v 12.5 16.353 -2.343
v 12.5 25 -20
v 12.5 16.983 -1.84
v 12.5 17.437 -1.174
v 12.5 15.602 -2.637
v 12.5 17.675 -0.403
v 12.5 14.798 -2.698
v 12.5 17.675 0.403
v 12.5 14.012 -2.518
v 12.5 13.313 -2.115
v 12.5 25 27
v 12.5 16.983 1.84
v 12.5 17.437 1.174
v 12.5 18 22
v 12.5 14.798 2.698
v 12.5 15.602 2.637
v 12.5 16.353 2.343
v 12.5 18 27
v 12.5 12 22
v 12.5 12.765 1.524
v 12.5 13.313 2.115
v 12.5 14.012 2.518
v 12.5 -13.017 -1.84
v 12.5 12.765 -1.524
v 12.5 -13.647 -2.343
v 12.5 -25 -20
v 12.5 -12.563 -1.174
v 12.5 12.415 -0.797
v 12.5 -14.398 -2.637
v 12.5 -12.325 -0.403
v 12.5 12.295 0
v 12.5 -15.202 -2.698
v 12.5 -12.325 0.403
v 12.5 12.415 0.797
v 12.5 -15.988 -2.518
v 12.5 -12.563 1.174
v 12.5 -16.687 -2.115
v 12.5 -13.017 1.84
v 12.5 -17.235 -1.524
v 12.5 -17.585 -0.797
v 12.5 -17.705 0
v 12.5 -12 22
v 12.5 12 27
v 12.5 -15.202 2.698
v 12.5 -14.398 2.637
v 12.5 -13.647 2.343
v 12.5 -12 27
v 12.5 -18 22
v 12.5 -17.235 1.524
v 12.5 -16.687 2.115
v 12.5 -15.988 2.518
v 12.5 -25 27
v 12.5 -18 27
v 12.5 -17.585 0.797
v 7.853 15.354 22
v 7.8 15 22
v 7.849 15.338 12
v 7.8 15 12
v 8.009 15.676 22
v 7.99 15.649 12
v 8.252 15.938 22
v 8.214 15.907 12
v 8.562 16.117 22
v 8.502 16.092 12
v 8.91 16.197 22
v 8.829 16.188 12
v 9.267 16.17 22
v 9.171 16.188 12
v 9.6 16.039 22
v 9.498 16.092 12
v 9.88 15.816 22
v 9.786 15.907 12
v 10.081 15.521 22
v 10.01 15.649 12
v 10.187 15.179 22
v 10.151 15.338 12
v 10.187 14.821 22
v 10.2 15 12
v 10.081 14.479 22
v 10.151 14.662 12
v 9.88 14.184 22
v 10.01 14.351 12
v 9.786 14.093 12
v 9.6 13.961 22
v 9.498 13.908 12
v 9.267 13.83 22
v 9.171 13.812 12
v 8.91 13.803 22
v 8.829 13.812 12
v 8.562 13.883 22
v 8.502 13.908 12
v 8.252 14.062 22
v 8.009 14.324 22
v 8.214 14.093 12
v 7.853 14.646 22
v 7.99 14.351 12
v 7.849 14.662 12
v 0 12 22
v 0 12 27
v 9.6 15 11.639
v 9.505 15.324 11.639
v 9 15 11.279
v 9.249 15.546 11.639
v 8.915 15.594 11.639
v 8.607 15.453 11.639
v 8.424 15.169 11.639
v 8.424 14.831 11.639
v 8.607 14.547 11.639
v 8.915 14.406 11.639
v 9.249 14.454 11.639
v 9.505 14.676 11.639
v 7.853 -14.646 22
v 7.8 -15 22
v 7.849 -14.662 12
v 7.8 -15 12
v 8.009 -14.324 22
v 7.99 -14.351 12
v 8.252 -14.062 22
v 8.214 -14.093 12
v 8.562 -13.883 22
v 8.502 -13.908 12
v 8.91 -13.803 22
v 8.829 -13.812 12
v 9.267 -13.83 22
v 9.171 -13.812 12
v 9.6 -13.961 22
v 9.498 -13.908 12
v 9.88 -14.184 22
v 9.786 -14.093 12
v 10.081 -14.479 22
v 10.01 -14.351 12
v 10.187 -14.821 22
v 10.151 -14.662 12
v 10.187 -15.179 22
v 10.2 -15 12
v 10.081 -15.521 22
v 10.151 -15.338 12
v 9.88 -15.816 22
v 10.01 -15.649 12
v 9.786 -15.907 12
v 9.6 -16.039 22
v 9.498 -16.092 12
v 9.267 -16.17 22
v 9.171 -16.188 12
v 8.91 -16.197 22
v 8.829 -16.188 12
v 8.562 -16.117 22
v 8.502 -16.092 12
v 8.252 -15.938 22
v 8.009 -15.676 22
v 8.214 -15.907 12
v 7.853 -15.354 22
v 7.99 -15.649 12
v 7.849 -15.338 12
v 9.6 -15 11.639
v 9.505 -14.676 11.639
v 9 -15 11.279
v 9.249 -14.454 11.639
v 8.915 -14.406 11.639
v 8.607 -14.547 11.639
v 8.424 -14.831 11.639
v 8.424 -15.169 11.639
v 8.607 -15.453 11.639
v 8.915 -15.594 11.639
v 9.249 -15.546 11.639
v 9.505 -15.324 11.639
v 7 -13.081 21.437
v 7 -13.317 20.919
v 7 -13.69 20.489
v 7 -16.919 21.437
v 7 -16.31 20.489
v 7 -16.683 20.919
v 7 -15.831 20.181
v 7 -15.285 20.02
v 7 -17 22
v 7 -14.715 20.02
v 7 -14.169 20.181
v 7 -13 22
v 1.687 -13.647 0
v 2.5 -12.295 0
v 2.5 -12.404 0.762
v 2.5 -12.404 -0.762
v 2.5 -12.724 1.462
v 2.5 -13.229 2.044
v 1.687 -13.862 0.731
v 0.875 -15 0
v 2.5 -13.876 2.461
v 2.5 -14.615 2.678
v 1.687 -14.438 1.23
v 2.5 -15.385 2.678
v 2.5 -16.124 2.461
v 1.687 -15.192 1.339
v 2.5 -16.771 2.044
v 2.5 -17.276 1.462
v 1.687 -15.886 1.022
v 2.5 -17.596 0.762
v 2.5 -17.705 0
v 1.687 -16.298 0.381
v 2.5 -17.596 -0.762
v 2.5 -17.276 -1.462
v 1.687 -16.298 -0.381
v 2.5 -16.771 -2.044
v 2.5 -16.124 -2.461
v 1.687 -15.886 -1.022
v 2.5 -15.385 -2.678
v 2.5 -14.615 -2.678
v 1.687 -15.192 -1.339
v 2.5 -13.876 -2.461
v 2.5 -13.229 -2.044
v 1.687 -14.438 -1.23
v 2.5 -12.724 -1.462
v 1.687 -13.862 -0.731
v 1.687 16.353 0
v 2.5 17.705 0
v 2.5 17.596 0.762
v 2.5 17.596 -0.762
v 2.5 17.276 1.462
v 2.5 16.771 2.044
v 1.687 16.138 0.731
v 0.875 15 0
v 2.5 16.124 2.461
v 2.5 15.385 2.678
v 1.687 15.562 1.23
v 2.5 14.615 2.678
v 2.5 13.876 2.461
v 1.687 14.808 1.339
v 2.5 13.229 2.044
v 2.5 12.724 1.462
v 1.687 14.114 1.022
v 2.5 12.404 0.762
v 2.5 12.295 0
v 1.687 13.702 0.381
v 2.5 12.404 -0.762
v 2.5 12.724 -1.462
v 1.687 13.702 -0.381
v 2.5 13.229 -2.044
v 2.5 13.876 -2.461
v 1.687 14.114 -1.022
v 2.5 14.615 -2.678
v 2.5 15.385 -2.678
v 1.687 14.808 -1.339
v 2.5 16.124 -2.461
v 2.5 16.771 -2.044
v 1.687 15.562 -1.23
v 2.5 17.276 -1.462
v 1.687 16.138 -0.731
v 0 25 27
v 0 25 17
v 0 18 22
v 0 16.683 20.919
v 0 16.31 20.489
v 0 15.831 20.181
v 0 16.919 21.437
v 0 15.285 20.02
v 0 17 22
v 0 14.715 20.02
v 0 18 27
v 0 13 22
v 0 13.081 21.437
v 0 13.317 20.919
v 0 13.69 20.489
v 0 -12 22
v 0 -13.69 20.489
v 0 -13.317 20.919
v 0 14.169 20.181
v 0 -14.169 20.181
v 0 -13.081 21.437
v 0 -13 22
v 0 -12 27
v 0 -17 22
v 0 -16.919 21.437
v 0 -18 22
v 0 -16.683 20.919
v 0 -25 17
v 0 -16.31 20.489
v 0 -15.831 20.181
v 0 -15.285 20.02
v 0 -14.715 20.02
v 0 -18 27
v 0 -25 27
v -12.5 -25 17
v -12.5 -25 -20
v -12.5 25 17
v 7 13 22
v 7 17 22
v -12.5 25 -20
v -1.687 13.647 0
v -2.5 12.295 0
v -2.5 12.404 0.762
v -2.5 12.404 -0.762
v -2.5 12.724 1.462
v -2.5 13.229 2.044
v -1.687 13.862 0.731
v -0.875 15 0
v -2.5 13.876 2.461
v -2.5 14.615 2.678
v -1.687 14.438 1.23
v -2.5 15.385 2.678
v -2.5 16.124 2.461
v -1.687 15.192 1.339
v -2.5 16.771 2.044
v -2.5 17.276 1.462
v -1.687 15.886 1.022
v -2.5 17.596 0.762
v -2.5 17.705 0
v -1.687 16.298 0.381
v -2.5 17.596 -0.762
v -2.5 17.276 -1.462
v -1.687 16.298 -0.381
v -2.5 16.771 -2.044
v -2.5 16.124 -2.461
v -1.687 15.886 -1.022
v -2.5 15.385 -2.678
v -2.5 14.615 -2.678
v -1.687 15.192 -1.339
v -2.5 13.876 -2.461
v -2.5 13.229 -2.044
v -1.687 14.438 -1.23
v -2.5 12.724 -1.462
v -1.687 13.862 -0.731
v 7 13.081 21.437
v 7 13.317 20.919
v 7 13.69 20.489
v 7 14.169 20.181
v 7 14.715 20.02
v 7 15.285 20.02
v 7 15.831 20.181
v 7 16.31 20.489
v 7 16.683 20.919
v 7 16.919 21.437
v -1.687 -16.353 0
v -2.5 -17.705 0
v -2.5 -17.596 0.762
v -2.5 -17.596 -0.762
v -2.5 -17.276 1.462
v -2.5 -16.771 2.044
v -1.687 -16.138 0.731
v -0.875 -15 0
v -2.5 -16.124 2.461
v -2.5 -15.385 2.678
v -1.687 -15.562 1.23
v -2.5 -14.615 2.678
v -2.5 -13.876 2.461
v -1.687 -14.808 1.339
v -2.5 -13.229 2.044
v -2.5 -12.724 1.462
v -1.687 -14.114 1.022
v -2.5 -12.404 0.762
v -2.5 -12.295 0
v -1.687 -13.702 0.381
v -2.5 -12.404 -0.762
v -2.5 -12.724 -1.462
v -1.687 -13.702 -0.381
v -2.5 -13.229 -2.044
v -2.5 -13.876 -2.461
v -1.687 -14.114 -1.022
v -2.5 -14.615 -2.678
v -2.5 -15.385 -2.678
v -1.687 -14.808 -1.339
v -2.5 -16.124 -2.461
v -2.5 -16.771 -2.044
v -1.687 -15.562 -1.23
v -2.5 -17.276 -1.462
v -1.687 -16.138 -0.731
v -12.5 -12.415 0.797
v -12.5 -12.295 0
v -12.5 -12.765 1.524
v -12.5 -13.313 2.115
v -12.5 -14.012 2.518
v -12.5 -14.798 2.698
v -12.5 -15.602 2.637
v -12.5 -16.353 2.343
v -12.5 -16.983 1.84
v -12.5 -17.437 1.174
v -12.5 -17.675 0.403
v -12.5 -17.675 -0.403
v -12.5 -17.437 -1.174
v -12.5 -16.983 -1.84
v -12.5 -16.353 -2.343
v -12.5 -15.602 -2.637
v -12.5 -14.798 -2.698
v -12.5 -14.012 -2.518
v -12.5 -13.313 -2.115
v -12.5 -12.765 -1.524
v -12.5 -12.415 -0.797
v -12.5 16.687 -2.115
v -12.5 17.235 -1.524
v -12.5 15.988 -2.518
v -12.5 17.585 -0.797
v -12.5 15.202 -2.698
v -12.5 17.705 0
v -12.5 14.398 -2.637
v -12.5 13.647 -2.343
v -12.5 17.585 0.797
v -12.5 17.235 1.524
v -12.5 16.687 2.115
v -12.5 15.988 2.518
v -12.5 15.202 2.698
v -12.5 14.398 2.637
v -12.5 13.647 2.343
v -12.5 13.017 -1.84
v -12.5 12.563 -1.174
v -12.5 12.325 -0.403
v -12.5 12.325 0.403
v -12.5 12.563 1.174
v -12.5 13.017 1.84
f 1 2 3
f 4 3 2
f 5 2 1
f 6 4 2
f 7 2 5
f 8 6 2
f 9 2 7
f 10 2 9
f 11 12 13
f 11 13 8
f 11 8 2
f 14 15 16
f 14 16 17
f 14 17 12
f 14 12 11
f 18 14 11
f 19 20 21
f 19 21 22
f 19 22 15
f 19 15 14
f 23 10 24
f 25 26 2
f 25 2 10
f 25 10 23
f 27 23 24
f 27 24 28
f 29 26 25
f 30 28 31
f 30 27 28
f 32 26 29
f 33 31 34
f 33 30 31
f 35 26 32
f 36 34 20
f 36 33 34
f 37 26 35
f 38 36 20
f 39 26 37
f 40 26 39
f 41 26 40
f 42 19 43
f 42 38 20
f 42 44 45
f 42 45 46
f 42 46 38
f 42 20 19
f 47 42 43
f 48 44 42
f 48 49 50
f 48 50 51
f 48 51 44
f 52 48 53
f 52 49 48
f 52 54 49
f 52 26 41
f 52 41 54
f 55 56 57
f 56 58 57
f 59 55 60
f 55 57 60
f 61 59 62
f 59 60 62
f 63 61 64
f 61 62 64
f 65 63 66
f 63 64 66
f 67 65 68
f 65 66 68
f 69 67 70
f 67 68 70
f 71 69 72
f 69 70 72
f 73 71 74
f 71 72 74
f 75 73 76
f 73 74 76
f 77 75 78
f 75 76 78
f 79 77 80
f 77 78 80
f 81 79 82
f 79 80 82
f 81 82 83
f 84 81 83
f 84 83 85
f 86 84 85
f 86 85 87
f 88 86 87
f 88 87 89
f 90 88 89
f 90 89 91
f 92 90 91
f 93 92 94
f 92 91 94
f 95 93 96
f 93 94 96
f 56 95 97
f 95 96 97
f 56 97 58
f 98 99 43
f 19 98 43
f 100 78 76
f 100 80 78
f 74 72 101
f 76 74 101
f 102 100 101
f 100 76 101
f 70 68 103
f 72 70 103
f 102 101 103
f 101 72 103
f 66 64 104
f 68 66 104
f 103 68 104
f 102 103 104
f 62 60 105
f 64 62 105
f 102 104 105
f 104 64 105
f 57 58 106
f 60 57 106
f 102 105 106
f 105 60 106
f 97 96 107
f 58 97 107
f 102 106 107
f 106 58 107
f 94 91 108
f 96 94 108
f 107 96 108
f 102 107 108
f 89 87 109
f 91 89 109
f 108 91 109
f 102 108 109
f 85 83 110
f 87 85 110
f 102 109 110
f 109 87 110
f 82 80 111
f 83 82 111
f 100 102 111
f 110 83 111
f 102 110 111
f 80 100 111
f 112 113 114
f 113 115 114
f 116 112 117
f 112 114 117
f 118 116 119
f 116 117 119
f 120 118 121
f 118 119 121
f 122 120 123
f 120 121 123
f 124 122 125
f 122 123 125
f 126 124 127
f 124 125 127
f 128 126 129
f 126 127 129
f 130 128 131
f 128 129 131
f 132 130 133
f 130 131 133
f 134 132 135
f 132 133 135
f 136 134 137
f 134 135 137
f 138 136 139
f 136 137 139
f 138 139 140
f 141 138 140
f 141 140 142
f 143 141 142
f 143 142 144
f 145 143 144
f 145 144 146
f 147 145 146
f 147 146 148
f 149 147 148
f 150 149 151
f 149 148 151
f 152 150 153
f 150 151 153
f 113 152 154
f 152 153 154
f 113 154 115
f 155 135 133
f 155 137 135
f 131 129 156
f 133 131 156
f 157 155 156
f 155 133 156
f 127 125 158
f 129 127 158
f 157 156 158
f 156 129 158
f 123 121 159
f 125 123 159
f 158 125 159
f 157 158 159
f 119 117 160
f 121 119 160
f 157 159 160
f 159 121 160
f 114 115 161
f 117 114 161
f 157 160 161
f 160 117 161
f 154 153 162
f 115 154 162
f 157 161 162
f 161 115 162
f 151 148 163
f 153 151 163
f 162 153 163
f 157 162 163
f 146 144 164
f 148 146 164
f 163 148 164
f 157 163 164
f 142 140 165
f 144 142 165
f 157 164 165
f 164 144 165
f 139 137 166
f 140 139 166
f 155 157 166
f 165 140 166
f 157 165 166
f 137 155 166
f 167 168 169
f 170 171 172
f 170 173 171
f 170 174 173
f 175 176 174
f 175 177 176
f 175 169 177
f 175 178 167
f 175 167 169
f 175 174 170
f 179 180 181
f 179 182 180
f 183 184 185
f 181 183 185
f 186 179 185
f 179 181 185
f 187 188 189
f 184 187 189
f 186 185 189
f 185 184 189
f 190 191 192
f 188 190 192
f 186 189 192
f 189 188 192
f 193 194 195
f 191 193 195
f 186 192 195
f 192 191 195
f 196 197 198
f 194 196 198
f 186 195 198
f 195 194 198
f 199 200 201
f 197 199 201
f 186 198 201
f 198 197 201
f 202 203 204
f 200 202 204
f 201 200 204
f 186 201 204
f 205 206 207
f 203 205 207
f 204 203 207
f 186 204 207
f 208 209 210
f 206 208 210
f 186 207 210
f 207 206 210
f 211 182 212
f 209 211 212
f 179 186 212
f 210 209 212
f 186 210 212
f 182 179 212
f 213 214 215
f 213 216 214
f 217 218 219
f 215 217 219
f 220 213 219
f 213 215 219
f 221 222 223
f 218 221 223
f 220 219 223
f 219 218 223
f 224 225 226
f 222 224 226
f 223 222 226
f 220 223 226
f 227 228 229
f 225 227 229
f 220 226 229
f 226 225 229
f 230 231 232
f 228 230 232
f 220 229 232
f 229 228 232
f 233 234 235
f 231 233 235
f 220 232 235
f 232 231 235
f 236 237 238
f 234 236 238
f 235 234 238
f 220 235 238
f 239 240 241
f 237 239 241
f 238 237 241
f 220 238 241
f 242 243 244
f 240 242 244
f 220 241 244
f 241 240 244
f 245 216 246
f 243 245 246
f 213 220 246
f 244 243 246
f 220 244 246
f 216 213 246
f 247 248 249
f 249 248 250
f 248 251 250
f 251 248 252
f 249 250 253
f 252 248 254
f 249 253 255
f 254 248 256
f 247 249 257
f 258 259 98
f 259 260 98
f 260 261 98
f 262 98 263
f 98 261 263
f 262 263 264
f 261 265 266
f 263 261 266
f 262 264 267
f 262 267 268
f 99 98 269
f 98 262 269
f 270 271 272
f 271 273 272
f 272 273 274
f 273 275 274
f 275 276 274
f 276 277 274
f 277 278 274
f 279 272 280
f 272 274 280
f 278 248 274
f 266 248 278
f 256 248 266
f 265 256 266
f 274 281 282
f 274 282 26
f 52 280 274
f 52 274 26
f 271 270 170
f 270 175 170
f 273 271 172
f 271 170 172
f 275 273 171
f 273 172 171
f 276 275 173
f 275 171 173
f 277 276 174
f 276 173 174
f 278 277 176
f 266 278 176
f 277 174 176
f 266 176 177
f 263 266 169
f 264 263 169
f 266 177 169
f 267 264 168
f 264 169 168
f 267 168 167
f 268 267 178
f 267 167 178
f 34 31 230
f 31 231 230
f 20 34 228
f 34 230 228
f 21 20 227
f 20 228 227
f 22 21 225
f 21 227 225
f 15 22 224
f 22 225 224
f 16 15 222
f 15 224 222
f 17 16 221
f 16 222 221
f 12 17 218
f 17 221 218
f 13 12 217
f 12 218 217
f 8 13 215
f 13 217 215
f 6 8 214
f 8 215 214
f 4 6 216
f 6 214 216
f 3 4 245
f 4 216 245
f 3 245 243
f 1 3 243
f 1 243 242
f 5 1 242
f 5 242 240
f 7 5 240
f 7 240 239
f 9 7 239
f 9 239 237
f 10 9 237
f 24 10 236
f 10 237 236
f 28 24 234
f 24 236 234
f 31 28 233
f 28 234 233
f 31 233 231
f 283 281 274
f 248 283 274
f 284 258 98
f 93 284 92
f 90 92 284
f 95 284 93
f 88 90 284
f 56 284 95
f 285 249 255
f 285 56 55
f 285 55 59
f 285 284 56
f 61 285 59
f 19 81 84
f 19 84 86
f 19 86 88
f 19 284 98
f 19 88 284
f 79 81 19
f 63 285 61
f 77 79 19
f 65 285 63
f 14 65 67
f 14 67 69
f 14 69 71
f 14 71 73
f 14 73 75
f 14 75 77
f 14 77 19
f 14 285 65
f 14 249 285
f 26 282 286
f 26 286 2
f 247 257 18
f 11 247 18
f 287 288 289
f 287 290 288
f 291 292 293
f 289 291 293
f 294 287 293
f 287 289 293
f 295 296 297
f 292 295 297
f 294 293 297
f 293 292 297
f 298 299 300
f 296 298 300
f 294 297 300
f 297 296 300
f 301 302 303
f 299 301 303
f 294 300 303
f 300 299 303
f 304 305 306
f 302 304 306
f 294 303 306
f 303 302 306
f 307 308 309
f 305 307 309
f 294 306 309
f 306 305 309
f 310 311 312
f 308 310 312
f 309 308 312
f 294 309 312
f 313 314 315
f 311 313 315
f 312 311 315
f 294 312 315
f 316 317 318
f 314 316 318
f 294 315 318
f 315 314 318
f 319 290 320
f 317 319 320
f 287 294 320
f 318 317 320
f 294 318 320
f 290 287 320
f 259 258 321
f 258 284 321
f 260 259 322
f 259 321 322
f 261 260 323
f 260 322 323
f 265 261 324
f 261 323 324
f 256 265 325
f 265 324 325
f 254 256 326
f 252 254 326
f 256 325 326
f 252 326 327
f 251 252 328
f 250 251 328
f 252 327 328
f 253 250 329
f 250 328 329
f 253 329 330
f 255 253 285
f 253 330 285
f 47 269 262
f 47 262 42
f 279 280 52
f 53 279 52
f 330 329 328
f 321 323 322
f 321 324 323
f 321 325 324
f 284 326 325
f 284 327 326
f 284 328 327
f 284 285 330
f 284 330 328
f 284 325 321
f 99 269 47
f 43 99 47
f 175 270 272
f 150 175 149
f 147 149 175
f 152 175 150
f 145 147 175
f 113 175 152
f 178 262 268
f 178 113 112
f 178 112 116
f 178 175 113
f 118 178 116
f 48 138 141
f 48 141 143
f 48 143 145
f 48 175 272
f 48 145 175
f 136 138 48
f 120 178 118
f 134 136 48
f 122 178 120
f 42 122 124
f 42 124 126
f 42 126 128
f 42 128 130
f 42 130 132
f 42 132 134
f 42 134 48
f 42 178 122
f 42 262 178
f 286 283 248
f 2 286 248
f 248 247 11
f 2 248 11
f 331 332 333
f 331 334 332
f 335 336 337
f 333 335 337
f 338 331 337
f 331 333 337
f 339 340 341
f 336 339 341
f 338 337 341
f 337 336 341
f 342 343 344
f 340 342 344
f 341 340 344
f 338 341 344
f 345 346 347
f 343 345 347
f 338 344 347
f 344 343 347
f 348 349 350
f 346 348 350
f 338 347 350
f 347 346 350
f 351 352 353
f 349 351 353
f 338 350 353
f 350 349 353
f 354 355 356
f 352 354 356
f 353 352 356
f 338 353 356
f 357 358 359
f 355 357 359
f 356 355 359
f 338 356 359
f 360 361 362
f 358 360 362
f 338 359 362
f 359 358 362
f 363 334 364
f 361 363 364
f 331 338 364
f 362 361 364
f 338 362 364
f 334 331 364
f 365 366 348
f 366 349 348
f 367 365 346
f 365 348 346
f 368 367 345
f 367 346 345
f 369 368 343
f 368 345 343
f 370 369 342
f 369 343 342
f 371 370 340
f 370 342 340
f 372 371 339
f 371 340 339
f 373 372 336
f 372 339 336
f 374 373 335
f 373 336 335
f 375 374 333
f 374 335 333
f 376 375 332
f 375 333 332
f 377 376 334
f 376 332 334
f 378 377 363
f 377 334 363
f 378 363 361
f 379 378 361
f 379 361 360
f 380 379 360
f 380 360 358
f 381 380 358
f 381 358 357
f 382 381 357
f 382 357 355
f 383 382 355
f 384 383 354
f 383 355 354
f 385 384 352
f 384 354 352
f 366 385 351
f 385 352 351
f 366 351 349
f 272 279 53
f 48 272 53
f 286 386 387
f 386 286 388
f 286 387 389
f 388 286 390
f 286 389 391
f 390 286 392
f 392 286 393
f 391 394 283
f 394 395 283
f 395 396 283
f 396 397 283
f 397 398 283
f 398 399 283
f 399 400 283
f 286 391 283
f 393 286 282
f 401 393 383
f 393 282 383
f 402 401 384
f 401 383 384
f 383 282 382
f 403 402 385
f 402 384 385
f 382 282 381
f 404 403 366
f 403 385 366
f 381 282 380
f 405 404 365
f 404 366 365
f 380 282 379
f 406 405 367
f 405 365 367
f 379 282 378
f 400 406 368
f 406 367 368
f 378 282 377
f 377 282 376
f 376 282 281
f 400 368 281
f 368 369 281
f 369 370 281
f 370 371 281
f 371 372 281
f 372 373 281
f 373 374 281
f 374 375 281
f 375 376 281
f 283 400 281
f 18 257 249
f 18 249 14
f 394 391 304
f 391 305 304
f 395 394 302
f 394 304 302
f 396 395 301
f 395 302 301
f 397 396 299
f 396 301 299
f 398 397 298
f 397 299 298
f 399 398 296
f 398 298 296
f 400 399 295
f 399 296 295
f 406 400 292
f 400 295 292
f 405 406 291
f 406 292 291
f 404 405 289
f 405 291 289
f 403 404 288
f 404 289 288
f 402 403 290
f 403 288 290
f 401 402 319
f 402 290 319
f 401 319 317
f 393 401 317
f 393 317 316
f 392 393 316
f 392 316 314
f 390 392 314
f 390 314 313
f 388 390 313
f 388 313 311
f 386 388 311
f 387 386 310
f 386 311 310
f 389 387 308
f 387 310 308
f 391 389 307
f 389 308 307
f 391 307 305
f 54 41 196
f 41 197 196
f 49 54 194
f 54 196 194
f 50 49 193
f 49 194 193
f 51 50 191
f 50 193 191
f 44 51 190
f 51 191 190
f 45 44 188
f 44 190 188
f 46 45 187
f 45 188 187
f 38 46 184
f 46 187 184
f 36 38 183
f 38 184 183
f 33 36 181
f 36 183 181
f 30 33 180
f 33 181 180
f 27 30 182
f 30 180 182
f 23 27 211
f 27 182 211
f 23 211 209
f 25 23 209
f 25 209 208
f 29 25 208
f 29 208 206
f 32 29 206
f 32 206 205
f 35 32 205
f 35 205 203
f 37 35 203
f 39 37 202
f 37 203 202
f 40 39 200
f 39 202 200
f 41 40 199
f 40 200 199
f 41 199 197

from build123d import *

# Parameters (mm, degrees)
F0_W             = 25
F0_H             = 47
F1_DEPTH         = 25
F4_D             = 5.4102
F4_DEPTH         = 10
F4_TIP           = 1.6253880605
F4_ON_F3_D       = 5.4102
F4_ON_F3_DEPTH   = 10
F4_ON_F3_TIP     = 1.6253880605
F5_W             = 12.5
F5_H             = 10
F6_DEPTH         = 50.001
F7_W             = 12.5
F7_H             = 6
F8_DEPTH         = 5
F11_D            = 2.4
F11_DEPTH        = 10
F11_TIP          = 0.7210327428
F11_ON_F10_D     = 2.4
F11_ON_F10_DEPTH = 10
F11_ON_F10_TIP   = 0.7210327428
F9_W             = 7
F9_H             = 2
F10_W            = 7
F10_H            = 2


with BuildPart() as f1:
    # F0 (on Front) → F1 (new body, symmetric)
    with BuildSketch(Plane.XZ):
        with Locations((0, 3.5)):
            Rectangle(F0_W, F0_H)
    extrude(amount=F1_DEPTH, both=True)

    # F4
    with Locations(Plane(origin=(-12.5, 0, 0), x_dir=(0, -1, 0), z_dir=(-1, 0, 0))):
        with Locations((-15, 0), (15, 0)):
            Hole(F4_D / 2, depth=F4_DEPTH)
            with Locations((0, 0, -(F4_DEPTH + F4_TIP / 2))):  # 118° drill point
                Cone(0, F4_D / 2, F4_TIP, mode=Mode.SUBTRACT)

    # F4 on F3
    with Locations(Plane.YZ.offset(12.5)):
        with Locations((-15, 0), (15, 0)):
            Hole(F4_ON_F3_D / 2, depth=F4_ON_F3_DEPTH)
            with Locations((0, 0, -(F4_ON_F3_DEPTH + F4_ON_F3_TIP / 2))):  # 118° drill point
                Cone(0, F4_ON_F3_D / 2, F4_ON_F3_TIP, mode=Mode.SUBTRACT)

    # F5 (on face) → F6 (cut, through all)
    with BuildSketch(Plane.XZ.offset(25)):
        with Locations((-6.25, 22)):
            Rectangle(F5_W, F5_H)
    extrude(amount=-F6_DEPTH, mode=Mode.SUBTRACT)

    # F7 (on face) → F8 (cut)
    with BuildSketch(Plane.XY.offset(27)):
        with Locations((6.25, 15)):
            Rectangle(F7_W, F7_H)
        with Locations((6.25, -15)):
            Rectangle(F7_W, F7_H)
    extrude(amount=-F8_DEPTH, mode=Mode.SUBTRACT)

    # F11
    with Locations(Plane.XY.offset(22)):
        with Locations((9, 15)):
            Hole(F11_D / 2, depth=F11_DEPTH)
            with Locations((0, 0, -(F11_DEPTH + F11_TIP / 2))):  # 118° drill point
                Cone(0, F11_D / 2, F11_TIP, mode=Mode.SUBTRACT)

    # F11 on F10
    with Locations(Plane.XY.offset(22)):
        with Locations((9, -15)):
            Hole(F11_ON_F10_D / 2, depth=F11_ON_F10_DEPTH)
            with Locations((0, 0, -(F11_ON_F10_DEPTH + F11_ON_F10_TIP / 2))):  # 118° drill point
                Cone(0, F11_ON_F10_D / 2, F11_ON_F10_TIP, mode=Mode.SUBTRACT)

    # F9 (on face) → F12 (revolve, cut)
    with BuildSketch(Plane.XY.offset(22)):
        with Locations((3.5, 16)):
            Rectangle(F9_W, F9_H)
    revolve(axis=Axis((7.6713971794, 15, 22), (1, 0, 0)), mode=Mode.SUBTRACT)

    # F10 (on face) → F13 (revolve, cut)
    with BuildSketch(Plane.XY.offset(22)):
        with Locations((3.5, -14)):
            Rectangle(F10_W, F10_H)
    revolve(axis=Axis((7.2402027436, -15, 22), (1, 0, 0)), mode=Mode.SUBTRACT)


solid = f1.part
